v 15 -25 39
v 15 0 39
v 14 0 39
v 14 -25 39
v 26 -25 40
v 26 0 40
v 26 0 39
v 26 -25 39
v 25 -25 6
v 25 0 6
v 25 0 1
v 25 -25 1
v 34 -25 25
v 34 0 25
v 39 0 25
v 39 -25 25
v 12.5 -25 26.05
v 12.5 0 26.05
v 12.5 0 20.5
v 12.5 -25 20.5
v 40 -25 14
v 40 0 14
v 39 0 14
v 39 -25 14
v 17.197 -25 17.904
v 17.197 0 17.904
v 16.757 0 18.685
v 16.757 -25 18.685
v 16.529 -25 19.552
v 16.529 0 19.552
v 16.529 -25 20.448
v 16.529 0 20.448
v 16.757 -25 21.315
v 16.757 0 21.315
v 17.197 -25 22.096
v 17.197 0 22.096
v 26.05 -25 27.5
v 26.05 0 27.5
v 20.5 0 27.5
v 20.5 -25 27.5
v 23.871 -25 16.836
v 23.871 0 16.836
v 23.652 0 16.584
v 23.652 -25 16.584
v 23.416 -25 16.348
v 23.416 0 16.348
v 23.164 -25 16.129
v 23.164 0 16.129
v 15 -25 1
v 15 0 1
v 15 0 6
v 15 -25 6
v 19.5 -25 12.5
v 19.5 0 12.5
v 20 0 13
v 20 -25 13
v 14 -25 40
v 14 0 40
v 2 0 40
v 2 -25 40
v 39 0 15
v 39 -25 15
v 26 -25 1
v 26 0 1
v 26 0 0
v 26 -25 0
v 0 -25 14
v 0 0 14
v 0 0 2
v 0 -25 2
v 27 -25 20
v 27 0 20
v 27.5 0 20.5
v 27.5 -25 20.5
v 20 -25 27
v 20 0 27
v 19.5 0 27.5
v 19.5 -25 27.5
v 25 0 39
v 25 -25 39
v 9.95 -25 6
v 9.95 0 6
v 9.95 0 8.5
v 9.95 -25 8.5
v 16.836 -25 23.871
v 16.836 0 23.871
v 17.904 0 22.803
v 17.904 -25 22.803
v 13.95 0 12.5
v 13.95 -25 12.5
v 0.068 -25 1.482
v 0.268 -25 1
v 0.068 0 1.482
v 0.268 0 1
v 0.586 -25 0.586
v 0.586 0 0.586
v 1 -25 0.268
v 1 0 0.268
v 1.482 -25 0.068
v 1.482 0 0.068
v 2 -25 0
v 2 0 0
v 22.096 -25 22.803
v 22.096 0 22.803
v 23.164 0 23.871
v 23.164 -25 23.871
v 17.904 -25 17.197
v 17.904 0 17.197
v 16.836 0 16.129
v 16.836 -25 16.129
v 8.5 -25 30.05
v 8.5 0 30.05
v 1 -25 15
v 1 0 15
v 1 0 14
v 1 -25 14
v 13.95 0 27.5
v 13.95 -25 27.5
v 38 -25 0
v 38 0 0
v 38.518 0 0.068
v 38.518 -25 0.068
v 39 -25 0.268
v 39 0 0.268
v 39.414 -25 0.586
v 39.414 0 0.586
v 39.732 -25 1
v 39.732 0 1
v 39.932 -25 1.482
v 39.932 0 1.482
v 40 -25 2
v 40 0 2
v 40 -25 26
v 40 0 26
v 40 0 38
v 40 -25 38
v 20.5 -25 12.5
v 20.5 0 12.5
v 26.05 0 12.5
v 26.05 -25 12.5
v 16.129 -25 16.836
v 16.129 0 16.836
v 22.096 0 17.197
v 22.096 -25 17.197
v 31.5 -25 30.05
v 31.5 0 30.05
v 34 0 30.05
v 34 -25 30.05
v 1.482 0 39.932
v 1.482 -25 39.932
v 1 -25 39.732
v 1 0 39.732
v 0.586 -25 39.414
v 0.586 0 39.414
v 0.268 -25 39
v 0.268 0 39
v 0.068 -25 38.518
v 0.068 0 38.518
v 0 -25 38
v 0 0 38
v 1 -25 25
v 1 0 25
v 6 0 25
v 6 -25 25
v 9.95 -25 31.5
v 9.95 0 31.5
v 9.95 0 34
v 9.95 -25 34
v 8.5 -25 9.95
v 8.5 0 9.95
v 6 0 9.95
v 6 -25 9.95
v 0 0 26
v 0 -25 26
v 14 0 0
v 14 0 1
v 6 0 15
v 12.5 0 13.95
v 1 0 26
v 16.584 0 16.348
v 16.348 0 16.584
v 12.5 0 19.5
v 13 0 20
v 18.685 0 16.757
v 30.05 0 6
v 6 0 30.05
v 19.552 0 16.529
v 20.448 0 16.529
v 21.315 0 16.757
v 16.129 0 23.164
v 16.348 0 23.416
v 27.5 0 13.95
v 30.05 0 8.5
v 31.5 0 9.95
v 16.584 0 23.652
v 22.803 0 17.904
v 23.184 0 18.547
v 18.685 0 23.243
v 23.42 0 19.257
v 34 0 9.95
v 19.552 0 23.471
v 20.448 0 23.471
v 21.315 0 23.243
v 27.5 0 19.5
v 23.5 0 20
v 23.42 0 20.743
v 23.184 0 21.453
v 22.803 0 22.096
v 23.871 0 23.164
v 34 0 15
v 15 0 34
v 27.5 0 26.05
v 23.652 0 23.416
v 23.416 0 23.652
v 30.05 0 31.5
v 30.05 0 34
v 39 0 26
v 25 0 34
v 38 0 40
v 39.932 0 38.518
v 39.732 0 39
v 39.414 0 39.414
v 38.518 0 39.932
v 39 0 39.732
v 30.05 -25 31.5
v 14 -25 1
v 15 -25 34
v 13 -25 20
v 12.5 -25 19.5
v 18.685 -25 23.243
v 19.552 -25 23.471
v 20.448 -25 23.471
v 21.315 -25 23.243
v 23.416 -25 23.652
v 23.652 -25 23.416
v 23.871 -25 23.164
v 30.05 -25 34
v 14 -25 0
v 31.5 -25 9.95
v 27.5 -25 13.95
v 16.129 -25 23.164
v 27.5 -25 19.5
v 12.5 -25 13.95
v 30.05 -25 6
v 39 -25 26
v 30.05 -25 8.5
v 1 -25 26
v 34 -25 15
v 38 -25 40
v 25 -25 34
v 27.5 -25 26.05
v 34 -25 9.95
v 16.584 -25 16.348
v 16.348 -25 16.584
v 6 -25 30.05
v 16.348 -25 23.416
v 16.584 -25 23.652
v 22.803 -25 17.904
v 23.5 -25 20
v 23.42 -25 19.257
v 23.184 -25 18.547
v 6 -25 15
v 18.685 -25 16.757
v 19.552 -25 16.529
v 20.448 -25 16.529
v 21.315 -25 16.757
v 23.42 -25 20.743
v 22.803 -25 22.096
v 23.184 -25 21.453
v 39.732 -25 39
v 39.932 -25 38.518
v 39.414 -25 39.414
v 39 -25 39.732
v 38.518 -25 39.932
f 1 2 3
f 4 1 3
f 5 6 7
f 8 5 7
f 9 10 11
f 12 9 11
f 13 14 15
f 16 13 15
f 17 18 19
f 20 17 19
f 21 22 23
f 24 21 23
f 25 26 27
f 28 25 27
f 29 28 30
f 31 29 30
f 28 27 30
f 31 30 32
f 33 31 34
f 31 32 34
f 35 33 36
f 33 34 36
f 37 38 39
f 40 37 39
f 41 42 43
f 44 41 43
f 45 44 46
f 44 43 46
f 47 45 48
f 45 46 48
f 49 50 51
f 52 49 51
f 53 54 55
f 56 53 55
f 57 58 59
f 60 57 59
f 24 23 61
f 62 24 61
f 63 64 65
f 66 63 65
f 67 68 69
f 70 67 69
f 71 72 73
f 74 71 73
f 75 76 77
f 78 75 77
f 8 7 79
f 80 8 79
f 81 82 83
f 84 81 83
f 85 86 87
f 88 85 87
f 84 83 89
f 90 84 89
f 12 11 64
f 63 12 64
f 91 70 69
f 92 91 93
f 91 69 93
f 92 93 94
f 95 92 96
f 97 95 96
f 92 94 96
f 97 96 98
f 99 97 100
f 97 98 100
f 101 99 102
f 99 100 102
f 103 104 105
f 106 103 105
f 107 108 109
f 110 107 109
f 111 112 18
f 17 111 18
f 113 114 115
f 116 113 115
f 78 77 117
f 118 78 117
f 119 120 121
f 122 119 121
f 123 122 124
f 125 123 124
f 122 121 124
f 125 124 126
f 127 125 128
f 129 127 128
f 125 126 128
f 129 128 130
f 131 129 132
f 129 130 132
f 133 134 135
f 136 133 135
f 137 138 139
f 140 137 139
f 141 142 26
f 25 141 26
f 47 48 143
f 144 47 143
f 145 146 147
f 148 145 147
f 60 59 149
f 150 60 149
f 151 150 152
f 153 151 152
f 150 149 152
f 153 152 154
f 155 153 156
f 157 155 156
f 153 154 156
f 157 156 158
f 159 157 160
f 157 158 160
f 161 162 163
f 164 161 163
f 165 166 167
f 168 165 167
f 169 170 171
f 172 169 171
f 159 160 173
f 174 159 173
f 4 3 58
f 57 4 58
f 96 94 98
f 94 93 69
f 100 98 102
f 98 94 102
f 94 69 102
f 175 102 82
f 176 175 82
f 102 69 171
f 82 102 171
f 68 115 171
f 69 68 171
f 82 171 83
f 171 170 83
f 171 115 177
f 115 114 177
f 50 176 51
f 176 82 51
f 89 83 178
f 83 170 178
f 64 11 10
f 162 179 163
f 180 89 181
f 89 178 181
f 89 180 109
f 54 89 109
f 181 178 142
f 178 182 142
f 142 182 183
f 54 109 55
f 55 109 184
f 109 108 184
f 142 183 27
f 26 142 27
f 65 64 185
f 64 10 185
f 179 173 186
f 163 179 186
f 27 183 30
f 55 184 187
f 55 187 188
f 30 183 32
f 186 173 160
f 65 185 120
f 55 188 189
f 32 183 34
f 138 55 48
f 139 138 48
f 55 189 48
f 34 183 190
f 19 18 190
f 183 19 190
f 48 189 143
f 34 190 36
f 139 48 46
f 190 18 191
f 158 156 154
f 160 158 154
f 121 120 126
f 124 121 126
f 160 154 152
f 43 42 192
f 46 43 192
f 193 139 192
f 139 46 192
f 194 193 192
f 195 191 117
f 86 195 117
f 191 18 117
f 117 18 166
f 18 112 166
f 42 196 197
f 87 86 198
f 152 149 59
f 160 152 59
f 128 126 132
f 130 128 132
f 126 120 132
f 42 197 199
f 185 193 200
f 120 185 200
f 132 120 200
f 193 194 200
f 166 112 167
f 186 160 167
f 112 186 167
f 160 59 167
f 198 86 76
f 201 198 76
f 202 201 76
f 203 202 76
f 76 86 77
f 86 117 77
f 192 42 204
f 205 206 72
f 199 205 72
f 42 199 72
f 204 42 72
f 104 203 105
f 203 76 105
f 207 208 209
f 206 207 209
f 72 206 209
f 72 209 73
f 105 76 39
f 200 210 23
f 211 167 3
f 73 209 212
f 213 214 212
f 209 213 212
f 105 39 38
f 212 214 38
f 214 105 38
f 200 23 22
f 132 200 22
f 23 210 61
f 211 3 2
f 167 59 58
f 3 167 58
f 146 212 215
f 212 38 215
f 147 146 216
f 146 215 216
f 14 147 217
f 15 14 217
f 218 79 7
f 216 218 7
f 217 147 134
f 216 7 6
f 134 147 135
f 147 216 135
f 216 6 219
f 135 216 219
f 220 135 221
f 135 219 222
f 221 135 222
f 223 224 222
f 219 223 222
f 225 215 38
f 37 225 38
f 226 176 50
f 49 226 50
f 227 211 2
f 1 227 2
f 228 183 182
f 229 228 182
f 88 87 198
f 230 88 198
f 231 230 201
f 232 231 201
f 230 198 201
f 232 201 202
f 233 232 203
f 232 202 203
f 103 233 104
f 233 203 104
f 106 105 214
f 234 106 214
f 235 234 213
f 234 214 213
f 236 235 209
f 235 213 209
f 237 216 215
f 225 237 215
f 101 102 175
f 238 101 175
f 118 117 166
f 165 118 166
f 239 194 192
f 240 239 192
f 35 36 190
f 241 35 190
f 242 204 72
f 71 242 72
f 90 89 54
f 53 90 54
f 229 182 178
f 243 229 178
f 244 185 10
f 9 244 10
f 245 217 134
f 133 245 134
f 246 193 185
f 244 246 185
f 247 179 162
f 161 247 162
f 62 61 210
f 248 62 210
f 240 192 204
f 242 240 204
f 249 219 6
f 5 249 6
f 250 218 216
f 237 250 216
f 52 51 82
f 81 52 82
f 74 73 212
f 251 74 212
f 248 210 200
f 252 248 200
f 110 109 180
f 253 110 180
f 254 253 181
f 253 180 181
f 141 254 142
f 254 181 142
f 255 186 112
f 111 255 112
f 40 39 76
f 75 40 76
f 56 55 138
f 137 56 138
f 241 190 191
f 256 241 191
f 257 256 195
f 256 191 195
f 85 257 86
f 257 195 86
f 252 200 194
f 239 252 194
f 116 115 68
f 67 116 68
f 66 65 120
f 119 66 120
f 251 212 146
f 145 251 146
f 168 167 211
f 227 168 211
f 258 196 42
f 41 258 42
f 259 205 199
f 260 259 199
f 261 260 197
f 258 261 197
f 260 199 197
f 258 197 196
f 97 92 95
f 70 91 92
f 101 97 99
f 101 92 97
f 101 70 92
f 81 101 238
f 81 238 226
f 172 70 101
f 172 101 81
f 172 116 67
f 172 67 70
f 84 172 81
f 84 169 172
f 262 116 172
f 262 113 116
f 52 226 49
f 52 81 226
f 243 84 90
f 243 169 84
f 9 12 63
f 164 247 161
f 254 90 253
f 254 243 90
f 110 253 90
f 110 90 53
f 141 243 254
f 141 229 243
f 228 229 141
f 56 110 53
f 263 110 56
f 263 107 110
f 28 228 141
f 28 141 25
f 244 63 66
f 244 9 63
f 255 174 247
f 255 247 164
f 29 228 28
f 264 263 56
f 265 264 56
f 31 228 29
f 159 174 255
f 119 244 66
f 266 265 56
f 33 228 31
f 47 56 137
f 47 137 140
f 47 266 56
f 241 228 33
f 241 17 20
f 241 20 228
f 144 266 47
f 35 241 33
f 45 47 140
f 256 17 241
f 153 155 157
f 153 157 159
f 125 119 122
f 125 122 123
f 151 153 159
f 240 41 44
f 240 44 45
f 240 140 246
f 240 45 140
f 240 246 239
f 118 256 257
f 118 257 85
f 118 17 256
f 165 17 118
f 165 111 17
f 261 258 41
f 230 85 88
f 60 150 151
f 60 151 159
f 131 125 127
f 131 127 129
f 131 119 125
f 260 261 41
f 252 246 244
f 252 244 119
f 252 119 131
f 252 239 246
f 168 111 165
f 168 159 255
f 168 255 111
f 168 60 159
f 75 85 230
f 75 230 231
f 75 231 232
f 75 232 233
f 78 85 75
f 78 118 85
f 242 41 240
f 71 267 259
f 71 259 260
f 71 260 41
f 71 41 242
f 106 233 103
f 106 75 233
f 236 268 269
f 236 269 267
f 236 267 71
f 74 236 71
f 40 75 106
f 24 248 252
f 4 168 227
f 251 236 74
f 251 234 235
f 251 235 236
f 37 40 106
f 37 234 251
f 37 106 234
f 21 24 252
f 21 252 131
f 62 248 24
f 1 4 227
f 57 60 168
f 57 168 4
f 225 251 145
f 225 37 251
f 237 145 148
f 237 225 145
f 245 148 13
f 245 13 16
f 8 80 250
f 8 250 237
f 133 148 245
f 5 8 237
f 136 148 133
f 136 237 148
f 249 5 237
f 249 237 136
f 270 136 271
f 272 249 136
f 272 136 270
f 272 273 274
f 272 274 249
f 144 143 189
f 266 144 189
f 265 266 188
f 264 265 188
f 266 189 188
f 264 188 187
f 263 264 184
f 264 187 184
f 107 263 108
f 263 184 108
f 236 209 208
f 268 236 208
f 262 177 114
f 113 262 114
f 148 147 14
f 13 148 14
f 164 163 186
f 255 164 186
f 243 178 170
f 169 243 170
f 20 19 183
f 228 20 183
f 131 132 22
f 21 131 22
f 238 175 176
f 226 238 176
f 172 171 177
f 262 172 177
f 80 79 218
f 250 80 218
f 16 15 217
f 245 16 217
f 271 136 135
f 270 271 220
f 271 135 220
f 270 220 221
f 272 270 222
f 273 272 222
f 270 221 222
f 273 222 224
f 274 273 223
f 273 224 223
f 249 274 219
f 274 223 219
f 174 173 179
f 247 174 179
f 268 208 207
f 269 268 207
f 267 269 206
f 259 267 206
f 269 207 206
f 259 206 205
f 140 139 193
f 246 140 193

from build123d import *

# Parameters (mm, degrees)
F1_DEPTH = 25


with BuildPart() as f1:
    # F0 (on Front) → F1 (new body)
    with BuildSketch(Plane.XZ):
        with BuildLine():
            ThreePointArc((0, 2), (0.5857864376, 0.5857864376), (2, 0))
            Line((2, 0), (14, 0))
            Line((14, 0), (14, 1))
            Line((14, 1), (15, 1))
            Line((15, 1), (15, 6))
            Line((15, 6), (9.95, 6))
            Line((9.95, 6), (9.95, 8.5))
            Line((9.95, 8.5), (13.95, 12.5))
            Line((13.95, 12.5), (19.5, 12.5))
            Line((19.5, 12.5), (20, 13))
            Line((20, 13), (20.5, 12.5))
            Line((20.5, 12.5), (26.05, 12.5))
            Line((26.05, 12.5), (30.05, 8.5))
            Line((30.05, 8.5), (30.05, 6))
            Line((30.05, 6), (25, 6))
            Line((25, 6), (25, 1))
            Line((25, 1), (26, 1))
            Line((26, 1), (26, 0))
            Line((26, 0), (38, 0))
            ThreePointArc((38, 0), (39.4142135624, 0.5857864376), (40, 2))
            Line((40, 2), (40, 14))
            Line((40, 14), (39, 14))
            Line((39, 14), (39, 15))
            Line((39, 15), (34, 15))
            Line((34, 15), (34, 9.95))
            Line((34, 9.95), (31.5, 9.95))
            Line((31.5, 9.95), (27.5, 13.95))
            Line((27.5, 13.95), (27.5, 19.5))
            Line((27.5, 19.5), (27, 20))
            Line((27, 20), (27.5, 20.5))
            Line((27.5, 20.5), (27.5, 26.05))
            Line((27.5, 26.05), (31.5, 30.05))
            Line((31.5, 30.05), (34, 30.05))
            Line((34, 30.05), (34, 25))
            Line((34, 25), (39, 25))
            Line((39, 25), (39, 26))
            Line((39, 26), (40, 26))
            Line((40, 26), (40, 38))
            ThreePointArc((40, 38), (39.4142135624, 39.4142135624), (38, 40))
            Line((38, 40), (26, 40))
            Line((26, 40), (26, 39))
            Line((26, 39), (25, 39))
            Line((25, 39), (25, 34))
            Line((25, 34), (30.05, 34))
            Line((30.05, 34), (30.05, 31.5))
            Line((30.05, 31.5), (26.05, 27.5))
            Line((26.05, 27.5), (20.5, 27.5))
            Line((20.5, 27.5), (20, 27))
            Line((20, 27), (19.5, 27.5))
            Line((19.5, 27.5), (13.95, 27.5))
            Line((13.95, 27.5), (9.95, 31.5))
            Line((9.95, 31.5), (9.95, 34))
            Line((9.95, 34), (15, 34))
            Line((15, 34), (15, 39))
            Line((15, 39), (14, 39))
            Line((14, 39), (14, 40))
            Line((14, 40), (2, 40))
            ThreePointArc((2, 40), (0.5857864376, 39.4142135624), (0, 38))
            Line((0, 38), (0, 26))
            Line((0, 26), (1, 26))
            Line((1, 26), (1, 25))
            Line((1, 25), (6, 25))
            Line((6, 25), (6, 30.05))
            Line((6, 30.05), (8.5, 30.05))
            Line((8.5, 30.05), (12.5, 26.05))
            Line((12.5, 26.05), (12.5, 20.5))
            Line((12.5, 20.5), (13, 20))
            Line((13, 20), (12.5, 19.5))
            Line((12.5, 19.5), (12.5, 13.95))
            Line((12.5, 13.95), (8.5, 9.95))
            Line((8.5, 9.95), (6, 9.95))
            Line((6, 9.95), (6, 15))
            Line((6, 15), (1, 15))
            Line((1, 15), (1, 14))
            Line((1, 14), (0, 14))
            Line((0, 14), (0, 2))
        make_face()
        with BuildLine():
            ThreePointArc((23.8713652105, 23.1642584293), (24.7093962486, 21.6797580105), (25, 20))
            ThreePointArc((25, 20), (24.7093962486, 18.3202419895), (23.8713652105, 16.8357415707))
            ThreePointArc((23.8713652105, 16.8357415707), (23.5355339059, 16.4644660941), (23.1642584293, 16.1286347895))
            ThreePointArc((23.1642584293, 16.1286347895), (20, 15), (16.8357415707, 16.1286347895))
            ThreePointArc((16.8357415707, 16.1286347895), (16.4644660941, 16.4644660941), (16.1286347895, 16.8357415707))
            ThreePointArc((16.1286347895, 16.8357415707), (15, 20), (16.1286347895, 23.1642584293))
            ThreePointArc((16.1286347895, 23.1642584293), (16.4644660941, 23.5355339059), (16.8357415707, 23.8713652105))
            ThreePointArc((16.8357415707, 23.8713652105), (20, 25), (23.1642584293, 23.8713652105))
            ThreePointArc((23.1642584293, 23.8713652105), (23.5355339059, 23.5355339059), (23.8713652105, 23.1642584293))
        make_face(mode=Mode.SUBTRACT)
        with BuildLine():
            Line((17.1969568666, 22.0959363522), (16.1286347895, 23.1642584293))
            ThreePointArc((16.1286347895, 23.1642584293), (15, 20), (16.1286347895, 16.8357415707))
            Line((16.1286347895, 16.8357415707), (17.1969568666, 17.9040636478))
            ThreePointArc((17.1969568666, 17.9040636478), (16.5, 20), (17.1969568666, 22.0959363522))
        make_face()
        with BuildLine():
            ThreePointArc((16.8357415707, 16.1286347895), (20, 15), (23.1642584293, 16.1286347895))
            Line((23.1642584293, 16.1286347895), (22.0959363522, 17.1969568666))
            ThreePointArc((22.0959363522, 17.1969568666), (20, 16.5), (17.9040636478, 17.1969568666))
            Line((17.9040636478, 17.1969568666), (16.8357415707, 16.1286347895))
        make_face()
        with BuildLine():
            ThreePointArc((23.8713652105, 16.8357415707), (24.7093962486, 18.3202419895), (25, 20))
            ThreePointArc((25, 20), (24.7093962486, 21.6797580105), (23.8713652105, 23.1642584293))
            Line((23.8713652105, 23.1642584293), (22.8030431334, 22.0959363522))
            ThreePointArc((22.8030431334, 22.0959363522), (23.3211933824, 21.1043887525), (23.5, 20))
            ThreePointArc((23.5, 20), (23.3211933824, 18.8956112475), (22.8030431334, 17.9040636478))
            Line((22.8030431334, 17.9040636478), (23.8713652105, 16.8357415707))
        make_face()
        with BuildLine():
            Line((22.0959363522, 22.8030431334), (23.1642584293, 23.8713652105))
            ThreePointArc((23.1642584293, 23.8713652105), (20, 25), (16.8357415707, 23.8713652105))
            Line((16.8357415707, 23.8713652105), (17.9040636478, 22.8030431334))
            ThreePointArc((17.9040636478, 22.8030431334), (20, 23.5), (22.0959363522, 22.8030431334))
        make_face()
    extrude(amount=F1_DEPTH)


solid = f1.part
